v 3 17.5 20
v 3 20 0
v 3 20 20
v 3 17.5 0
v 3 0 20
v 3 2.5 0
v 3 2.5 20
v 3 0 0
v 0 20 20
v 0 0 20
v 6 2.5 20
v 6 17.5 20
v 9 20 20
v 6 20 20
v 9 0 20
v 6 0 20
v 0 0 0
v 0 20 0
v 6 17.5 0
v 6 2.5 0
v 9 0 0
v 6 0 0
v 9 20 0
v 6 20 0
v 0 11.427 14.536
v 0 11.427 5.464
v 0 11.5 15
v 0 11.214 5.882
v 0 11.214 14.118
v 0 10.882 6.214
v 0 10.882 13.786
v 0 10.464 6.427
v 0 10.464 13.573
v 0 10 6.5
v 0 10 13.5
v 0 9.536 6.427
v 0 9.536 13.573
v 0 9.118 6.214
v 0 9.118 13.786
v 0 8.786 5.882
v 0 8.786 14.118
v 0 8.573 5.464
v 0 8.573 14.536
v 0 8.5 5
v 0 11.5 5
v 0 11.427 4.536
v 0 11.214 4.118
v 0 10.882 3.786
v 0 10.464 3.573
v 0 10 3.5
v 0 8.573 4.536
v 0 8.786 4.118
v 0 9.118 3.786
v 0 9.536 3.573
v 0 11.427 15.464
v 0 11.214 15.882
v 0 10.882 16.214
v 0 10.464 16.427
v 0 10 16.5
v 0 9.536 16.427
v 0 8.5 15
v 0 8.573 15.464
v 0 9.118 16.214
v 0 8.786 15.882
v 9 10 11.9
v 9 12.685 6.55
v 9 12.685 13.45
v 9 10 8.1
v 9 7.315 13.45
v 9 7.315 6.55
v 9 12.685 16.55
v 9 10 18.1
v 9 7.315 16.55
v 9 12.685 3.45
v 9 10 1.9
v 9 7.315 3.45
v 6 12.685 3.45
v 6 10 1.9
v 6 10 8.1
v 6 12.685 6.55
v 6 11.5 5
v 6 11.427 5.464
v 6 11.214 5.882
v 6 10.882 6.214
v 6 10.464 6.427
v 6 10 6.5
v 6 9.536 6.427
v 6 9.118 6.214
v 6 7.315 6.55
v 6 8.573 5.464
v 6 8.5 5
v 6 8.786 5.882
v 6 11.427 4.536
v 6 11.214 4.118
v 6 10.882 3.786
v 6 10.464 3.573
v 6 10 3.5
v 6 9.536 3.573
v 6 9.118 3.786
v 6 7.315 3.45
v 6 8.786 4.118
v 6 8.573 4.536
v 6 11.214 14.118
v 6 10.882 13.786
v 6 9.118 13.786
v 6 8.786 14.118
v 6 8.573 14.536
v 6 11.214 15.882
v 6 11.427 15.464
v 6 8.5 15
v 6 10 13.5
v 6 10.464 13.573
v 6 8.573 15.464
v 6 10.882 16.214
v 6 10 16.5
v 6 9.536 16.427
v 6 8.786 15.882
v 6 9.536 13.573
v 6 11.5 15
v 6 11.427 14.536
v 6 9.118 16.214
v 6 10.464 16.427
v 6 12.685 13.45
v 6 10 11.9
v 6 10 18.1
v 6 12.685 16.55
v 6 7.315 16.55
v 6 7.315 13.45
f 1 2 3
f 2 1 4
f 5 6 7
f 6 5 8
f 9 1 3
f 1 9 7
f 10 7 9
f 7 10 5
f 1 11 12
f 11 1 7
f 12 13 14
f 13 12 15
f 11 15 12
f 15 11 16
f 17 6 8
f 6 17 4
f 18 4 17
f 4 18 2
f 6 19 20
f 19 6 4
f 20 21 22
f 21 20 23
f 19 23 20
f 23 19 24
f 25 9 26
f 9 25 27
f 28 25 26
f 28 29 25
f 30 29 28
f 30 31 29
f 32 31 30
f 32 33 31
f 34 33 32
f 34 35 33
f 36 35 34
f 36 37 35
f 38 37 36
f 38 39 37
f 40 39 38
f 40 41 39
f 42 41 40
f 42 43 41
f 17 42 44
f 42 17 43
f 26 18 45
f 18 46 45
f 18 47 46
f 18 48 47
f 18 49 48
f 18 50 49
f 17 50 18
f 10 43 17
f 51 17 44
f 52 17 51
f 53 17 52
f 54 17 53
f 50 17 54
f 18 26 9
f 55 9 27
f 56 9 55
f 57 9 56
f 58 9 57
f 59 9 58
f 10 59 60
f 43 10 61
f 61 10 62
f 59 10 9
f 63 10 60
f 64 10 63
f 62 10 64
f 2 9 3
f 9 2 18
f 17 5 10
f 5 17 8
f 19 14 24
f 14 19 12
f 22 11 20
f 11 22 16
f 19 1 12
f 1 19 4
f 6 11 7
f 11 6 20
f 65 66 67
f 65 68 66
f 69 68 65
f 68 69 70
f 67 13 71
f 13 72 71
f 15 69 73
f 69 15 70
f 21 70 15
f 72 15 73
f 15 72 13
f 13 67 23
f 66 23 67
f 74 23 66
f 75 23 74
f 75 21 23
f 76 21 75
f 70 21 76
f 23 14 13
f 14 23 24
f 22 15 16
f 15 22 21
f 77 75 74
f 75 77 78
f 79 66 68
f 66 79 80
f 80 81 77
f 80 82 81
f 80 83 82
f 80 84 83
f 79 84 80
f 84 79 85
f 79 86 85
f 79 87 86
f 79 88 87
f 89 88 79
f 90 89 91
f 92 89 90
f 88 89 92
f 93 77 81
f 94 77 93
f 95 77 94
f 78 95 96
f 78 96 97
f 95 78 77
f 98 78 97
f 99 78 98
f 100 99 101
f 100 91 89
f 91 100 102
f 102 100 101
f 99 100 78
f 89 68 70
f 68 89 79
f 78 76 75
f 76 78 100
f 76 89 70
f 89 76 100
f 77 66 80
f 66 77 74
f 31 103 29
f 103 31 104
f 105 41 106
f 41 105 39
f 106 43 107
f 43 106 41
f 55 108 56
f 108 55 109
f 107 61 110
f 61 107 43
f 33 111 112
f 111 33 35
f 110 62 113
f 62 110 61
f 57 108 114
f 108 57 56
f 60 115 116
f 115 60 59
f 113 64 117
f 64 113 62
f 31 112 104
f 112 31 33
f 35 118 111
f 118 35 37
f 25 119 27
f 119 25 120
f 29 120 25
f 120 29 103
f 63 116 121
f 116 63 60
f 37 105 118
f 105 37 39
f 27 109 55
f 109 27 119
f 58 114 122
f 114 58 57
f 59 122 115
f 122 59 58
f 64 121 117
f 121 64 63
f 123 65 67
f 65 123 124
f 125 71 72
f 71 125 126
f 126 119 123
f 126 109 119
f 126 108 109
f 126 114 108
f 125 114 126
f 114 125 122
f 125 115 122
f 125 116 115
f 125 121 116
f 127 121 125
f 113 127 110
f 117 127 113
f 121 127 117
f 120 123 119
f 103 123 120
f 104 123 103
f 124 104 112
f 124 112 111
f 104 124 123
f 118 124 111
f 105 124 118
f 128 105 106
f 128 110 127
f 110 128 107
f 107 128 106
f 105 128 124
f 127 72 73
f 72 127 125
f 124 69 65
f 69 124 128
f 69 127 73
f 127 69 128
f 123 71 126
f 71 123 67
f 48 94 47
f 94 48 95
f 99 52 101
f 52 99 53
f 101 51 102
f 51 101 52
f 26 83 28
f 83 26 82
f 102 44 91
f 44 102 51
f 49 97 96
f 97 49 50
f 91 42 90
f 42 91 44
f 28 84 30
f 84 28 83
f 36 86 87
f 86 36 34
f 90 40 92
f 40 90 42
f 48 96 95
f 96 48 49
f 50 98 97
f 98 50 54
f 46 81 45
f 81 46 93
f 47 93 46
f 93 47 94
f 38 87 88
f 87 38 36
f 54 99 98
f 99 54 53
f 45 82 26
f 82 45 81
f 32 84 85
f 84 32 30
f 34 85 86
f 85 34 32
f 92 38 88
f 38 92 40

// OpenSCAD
/*mt = 3;
ht = 3;
lt = 3;
s=1.3;

translate([0,0,-lt])
rotate([180,0,0])
linear_extrude(height=lt, scale=[s,1], center=true)
square([20,30], center=true);


cube([20,30,mt],center=true);

translate([0,0,lt])
linear_extrude(height=ht, scale=[s,1], center=true)
square([20,30], center=true);
*/

difference()
{
union()
{
cube([3,20,20]);
translate([3,2.5,0])
cube([3,15,20]);
translate([6,0,0])
cube([3,20,20]);
}


union()
{
translate([6,10,5])
rotate([0,90,0])
cylinder(h=20,r=3.1,$fn=6);

translate([-.1,10,15])
rotate([0,90,0])
cylinder(h=20,r=1.5,$fn=20);



translate([6,10,15])
rotate([0,90,0])
cylinder(h=20,r=3.1,$fn=6);

translate([-.1,10,5])
rotate([0,90,0])
cylinder(h=20,r=1.5,$fn=20);

}
}
